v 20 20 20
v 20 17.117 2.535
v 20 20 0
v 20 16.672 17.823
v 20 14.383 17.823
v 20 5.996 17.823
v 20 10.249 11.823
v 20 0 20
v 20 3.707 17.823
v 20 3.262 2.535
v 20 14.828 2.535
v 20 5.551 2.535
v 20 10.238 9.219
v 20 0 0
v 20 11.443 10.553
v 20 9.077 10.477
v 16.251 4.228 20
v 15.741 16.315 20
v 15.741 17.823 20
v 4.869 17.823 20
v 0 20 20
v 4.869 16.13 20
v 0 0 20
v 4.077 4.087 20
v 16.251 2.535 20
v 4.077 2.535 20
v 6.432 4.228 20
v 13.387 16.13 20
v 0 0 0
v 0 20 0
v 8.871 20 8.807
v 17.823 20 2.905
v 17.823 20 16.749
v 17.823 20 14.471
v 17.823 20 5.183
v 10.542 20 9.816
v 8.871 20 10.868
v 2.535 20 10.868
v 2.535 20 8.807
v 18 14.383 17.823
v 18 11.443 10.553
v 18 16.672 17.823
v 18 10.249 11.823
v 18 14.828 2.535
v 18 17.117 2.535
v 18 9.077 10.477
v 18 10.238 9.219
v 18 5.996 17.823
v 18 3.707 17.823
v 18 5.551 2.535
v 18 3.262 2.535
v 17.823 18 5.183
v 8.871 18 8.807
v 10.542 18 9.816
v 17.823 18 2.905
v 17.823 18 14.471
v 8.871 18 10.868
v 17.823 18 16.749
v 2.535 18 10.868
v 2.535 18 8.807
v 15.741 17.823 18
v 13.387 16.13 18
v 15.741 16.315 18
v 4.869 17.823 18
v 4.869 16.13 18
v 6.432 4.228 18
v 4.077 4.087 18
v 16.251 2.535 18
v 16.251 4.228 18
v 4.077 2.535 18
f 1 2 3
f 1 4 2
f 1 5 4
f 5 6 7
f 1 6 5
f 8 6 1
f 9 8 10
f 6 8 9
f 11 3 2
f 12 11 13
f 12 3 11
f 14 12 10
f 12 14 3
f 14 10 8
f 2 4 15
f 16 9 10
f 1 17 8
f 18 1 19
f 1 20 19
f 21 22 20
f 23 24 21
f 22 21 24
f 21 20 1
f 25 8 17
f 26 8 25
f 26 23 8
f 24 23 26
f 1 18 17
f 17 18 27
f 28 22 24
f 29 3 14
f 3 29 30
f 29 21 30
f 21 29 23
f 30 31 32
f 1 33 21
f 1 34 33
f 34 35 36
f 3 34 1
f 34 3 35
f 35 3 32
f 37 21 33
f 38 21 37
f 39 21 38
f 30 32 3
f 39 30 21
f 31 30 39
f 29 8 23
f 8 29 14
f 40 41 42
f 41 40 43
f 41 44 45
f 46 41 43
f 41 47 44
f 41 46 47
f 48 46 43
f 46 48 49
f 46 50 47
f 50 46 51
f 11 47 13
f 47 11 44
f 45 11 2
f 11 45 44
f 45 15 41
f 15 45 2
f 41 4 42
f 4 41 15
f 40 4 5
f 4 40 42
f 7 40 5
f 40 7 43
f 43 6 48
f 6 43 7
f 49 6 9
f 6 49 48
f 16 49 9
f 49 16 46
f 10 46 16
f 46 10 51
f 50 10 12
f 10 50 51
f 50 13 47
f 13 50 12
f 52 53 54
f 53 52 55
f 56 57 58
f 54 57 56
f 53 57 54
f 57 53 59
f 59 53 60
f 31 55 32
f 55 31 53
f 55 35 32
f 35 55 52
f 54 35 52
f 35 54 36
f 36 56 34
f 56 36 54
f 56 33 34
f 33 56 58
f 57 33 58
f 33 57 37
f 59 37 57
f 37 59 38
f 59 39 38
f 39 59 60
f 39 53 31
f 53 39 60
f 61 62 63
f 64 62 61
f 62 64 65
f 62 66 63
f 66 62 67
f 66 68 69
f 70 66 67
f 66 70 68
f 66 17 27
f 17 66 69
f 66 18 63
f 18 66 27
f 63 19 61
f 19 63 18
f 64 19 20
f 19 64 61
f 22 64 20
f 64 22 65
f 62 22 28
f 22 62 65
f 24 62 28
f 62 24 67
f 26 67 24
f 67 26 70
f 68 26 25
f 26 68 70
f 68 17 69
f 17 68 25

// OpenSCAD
// cube side length
side=20;
// font size percentage
ptext=side*0.8;
// letters depth
depth=2;

cube_xyz(side, ptext, depth);

module cube_xyz(i_side,i_ptext,i_depth) {
    insurance=0.1;

    difference() {
        cube(i_side, false);

        translate([i_side - i_depth, i_side / 2, i_side / 2]) {
            rotate(a=[90, 0, 90]) {
                linear_extrude(i_depth + insurance) {
                    text("X", size = i_ptext, halign = "center", valign = "center");
                }
            }
        }

        translate([i_side / 2, i_side + i_depth, i_side / 2]) {
            rotate(a=[90, 90, 0]) {
                linear_extrude(2*i_depth) {
                    text("Y", size = i_ptext, halign = "center", valign = "center");
                }
            }
        }

        translate([i_side/2,i_side/2,i_side - i_depth]) {
            linear_extrude(i_depth+insurance) {
                text("Z",size=i_ptext,halign="center",valign="center");
            }
        }
    }
}
